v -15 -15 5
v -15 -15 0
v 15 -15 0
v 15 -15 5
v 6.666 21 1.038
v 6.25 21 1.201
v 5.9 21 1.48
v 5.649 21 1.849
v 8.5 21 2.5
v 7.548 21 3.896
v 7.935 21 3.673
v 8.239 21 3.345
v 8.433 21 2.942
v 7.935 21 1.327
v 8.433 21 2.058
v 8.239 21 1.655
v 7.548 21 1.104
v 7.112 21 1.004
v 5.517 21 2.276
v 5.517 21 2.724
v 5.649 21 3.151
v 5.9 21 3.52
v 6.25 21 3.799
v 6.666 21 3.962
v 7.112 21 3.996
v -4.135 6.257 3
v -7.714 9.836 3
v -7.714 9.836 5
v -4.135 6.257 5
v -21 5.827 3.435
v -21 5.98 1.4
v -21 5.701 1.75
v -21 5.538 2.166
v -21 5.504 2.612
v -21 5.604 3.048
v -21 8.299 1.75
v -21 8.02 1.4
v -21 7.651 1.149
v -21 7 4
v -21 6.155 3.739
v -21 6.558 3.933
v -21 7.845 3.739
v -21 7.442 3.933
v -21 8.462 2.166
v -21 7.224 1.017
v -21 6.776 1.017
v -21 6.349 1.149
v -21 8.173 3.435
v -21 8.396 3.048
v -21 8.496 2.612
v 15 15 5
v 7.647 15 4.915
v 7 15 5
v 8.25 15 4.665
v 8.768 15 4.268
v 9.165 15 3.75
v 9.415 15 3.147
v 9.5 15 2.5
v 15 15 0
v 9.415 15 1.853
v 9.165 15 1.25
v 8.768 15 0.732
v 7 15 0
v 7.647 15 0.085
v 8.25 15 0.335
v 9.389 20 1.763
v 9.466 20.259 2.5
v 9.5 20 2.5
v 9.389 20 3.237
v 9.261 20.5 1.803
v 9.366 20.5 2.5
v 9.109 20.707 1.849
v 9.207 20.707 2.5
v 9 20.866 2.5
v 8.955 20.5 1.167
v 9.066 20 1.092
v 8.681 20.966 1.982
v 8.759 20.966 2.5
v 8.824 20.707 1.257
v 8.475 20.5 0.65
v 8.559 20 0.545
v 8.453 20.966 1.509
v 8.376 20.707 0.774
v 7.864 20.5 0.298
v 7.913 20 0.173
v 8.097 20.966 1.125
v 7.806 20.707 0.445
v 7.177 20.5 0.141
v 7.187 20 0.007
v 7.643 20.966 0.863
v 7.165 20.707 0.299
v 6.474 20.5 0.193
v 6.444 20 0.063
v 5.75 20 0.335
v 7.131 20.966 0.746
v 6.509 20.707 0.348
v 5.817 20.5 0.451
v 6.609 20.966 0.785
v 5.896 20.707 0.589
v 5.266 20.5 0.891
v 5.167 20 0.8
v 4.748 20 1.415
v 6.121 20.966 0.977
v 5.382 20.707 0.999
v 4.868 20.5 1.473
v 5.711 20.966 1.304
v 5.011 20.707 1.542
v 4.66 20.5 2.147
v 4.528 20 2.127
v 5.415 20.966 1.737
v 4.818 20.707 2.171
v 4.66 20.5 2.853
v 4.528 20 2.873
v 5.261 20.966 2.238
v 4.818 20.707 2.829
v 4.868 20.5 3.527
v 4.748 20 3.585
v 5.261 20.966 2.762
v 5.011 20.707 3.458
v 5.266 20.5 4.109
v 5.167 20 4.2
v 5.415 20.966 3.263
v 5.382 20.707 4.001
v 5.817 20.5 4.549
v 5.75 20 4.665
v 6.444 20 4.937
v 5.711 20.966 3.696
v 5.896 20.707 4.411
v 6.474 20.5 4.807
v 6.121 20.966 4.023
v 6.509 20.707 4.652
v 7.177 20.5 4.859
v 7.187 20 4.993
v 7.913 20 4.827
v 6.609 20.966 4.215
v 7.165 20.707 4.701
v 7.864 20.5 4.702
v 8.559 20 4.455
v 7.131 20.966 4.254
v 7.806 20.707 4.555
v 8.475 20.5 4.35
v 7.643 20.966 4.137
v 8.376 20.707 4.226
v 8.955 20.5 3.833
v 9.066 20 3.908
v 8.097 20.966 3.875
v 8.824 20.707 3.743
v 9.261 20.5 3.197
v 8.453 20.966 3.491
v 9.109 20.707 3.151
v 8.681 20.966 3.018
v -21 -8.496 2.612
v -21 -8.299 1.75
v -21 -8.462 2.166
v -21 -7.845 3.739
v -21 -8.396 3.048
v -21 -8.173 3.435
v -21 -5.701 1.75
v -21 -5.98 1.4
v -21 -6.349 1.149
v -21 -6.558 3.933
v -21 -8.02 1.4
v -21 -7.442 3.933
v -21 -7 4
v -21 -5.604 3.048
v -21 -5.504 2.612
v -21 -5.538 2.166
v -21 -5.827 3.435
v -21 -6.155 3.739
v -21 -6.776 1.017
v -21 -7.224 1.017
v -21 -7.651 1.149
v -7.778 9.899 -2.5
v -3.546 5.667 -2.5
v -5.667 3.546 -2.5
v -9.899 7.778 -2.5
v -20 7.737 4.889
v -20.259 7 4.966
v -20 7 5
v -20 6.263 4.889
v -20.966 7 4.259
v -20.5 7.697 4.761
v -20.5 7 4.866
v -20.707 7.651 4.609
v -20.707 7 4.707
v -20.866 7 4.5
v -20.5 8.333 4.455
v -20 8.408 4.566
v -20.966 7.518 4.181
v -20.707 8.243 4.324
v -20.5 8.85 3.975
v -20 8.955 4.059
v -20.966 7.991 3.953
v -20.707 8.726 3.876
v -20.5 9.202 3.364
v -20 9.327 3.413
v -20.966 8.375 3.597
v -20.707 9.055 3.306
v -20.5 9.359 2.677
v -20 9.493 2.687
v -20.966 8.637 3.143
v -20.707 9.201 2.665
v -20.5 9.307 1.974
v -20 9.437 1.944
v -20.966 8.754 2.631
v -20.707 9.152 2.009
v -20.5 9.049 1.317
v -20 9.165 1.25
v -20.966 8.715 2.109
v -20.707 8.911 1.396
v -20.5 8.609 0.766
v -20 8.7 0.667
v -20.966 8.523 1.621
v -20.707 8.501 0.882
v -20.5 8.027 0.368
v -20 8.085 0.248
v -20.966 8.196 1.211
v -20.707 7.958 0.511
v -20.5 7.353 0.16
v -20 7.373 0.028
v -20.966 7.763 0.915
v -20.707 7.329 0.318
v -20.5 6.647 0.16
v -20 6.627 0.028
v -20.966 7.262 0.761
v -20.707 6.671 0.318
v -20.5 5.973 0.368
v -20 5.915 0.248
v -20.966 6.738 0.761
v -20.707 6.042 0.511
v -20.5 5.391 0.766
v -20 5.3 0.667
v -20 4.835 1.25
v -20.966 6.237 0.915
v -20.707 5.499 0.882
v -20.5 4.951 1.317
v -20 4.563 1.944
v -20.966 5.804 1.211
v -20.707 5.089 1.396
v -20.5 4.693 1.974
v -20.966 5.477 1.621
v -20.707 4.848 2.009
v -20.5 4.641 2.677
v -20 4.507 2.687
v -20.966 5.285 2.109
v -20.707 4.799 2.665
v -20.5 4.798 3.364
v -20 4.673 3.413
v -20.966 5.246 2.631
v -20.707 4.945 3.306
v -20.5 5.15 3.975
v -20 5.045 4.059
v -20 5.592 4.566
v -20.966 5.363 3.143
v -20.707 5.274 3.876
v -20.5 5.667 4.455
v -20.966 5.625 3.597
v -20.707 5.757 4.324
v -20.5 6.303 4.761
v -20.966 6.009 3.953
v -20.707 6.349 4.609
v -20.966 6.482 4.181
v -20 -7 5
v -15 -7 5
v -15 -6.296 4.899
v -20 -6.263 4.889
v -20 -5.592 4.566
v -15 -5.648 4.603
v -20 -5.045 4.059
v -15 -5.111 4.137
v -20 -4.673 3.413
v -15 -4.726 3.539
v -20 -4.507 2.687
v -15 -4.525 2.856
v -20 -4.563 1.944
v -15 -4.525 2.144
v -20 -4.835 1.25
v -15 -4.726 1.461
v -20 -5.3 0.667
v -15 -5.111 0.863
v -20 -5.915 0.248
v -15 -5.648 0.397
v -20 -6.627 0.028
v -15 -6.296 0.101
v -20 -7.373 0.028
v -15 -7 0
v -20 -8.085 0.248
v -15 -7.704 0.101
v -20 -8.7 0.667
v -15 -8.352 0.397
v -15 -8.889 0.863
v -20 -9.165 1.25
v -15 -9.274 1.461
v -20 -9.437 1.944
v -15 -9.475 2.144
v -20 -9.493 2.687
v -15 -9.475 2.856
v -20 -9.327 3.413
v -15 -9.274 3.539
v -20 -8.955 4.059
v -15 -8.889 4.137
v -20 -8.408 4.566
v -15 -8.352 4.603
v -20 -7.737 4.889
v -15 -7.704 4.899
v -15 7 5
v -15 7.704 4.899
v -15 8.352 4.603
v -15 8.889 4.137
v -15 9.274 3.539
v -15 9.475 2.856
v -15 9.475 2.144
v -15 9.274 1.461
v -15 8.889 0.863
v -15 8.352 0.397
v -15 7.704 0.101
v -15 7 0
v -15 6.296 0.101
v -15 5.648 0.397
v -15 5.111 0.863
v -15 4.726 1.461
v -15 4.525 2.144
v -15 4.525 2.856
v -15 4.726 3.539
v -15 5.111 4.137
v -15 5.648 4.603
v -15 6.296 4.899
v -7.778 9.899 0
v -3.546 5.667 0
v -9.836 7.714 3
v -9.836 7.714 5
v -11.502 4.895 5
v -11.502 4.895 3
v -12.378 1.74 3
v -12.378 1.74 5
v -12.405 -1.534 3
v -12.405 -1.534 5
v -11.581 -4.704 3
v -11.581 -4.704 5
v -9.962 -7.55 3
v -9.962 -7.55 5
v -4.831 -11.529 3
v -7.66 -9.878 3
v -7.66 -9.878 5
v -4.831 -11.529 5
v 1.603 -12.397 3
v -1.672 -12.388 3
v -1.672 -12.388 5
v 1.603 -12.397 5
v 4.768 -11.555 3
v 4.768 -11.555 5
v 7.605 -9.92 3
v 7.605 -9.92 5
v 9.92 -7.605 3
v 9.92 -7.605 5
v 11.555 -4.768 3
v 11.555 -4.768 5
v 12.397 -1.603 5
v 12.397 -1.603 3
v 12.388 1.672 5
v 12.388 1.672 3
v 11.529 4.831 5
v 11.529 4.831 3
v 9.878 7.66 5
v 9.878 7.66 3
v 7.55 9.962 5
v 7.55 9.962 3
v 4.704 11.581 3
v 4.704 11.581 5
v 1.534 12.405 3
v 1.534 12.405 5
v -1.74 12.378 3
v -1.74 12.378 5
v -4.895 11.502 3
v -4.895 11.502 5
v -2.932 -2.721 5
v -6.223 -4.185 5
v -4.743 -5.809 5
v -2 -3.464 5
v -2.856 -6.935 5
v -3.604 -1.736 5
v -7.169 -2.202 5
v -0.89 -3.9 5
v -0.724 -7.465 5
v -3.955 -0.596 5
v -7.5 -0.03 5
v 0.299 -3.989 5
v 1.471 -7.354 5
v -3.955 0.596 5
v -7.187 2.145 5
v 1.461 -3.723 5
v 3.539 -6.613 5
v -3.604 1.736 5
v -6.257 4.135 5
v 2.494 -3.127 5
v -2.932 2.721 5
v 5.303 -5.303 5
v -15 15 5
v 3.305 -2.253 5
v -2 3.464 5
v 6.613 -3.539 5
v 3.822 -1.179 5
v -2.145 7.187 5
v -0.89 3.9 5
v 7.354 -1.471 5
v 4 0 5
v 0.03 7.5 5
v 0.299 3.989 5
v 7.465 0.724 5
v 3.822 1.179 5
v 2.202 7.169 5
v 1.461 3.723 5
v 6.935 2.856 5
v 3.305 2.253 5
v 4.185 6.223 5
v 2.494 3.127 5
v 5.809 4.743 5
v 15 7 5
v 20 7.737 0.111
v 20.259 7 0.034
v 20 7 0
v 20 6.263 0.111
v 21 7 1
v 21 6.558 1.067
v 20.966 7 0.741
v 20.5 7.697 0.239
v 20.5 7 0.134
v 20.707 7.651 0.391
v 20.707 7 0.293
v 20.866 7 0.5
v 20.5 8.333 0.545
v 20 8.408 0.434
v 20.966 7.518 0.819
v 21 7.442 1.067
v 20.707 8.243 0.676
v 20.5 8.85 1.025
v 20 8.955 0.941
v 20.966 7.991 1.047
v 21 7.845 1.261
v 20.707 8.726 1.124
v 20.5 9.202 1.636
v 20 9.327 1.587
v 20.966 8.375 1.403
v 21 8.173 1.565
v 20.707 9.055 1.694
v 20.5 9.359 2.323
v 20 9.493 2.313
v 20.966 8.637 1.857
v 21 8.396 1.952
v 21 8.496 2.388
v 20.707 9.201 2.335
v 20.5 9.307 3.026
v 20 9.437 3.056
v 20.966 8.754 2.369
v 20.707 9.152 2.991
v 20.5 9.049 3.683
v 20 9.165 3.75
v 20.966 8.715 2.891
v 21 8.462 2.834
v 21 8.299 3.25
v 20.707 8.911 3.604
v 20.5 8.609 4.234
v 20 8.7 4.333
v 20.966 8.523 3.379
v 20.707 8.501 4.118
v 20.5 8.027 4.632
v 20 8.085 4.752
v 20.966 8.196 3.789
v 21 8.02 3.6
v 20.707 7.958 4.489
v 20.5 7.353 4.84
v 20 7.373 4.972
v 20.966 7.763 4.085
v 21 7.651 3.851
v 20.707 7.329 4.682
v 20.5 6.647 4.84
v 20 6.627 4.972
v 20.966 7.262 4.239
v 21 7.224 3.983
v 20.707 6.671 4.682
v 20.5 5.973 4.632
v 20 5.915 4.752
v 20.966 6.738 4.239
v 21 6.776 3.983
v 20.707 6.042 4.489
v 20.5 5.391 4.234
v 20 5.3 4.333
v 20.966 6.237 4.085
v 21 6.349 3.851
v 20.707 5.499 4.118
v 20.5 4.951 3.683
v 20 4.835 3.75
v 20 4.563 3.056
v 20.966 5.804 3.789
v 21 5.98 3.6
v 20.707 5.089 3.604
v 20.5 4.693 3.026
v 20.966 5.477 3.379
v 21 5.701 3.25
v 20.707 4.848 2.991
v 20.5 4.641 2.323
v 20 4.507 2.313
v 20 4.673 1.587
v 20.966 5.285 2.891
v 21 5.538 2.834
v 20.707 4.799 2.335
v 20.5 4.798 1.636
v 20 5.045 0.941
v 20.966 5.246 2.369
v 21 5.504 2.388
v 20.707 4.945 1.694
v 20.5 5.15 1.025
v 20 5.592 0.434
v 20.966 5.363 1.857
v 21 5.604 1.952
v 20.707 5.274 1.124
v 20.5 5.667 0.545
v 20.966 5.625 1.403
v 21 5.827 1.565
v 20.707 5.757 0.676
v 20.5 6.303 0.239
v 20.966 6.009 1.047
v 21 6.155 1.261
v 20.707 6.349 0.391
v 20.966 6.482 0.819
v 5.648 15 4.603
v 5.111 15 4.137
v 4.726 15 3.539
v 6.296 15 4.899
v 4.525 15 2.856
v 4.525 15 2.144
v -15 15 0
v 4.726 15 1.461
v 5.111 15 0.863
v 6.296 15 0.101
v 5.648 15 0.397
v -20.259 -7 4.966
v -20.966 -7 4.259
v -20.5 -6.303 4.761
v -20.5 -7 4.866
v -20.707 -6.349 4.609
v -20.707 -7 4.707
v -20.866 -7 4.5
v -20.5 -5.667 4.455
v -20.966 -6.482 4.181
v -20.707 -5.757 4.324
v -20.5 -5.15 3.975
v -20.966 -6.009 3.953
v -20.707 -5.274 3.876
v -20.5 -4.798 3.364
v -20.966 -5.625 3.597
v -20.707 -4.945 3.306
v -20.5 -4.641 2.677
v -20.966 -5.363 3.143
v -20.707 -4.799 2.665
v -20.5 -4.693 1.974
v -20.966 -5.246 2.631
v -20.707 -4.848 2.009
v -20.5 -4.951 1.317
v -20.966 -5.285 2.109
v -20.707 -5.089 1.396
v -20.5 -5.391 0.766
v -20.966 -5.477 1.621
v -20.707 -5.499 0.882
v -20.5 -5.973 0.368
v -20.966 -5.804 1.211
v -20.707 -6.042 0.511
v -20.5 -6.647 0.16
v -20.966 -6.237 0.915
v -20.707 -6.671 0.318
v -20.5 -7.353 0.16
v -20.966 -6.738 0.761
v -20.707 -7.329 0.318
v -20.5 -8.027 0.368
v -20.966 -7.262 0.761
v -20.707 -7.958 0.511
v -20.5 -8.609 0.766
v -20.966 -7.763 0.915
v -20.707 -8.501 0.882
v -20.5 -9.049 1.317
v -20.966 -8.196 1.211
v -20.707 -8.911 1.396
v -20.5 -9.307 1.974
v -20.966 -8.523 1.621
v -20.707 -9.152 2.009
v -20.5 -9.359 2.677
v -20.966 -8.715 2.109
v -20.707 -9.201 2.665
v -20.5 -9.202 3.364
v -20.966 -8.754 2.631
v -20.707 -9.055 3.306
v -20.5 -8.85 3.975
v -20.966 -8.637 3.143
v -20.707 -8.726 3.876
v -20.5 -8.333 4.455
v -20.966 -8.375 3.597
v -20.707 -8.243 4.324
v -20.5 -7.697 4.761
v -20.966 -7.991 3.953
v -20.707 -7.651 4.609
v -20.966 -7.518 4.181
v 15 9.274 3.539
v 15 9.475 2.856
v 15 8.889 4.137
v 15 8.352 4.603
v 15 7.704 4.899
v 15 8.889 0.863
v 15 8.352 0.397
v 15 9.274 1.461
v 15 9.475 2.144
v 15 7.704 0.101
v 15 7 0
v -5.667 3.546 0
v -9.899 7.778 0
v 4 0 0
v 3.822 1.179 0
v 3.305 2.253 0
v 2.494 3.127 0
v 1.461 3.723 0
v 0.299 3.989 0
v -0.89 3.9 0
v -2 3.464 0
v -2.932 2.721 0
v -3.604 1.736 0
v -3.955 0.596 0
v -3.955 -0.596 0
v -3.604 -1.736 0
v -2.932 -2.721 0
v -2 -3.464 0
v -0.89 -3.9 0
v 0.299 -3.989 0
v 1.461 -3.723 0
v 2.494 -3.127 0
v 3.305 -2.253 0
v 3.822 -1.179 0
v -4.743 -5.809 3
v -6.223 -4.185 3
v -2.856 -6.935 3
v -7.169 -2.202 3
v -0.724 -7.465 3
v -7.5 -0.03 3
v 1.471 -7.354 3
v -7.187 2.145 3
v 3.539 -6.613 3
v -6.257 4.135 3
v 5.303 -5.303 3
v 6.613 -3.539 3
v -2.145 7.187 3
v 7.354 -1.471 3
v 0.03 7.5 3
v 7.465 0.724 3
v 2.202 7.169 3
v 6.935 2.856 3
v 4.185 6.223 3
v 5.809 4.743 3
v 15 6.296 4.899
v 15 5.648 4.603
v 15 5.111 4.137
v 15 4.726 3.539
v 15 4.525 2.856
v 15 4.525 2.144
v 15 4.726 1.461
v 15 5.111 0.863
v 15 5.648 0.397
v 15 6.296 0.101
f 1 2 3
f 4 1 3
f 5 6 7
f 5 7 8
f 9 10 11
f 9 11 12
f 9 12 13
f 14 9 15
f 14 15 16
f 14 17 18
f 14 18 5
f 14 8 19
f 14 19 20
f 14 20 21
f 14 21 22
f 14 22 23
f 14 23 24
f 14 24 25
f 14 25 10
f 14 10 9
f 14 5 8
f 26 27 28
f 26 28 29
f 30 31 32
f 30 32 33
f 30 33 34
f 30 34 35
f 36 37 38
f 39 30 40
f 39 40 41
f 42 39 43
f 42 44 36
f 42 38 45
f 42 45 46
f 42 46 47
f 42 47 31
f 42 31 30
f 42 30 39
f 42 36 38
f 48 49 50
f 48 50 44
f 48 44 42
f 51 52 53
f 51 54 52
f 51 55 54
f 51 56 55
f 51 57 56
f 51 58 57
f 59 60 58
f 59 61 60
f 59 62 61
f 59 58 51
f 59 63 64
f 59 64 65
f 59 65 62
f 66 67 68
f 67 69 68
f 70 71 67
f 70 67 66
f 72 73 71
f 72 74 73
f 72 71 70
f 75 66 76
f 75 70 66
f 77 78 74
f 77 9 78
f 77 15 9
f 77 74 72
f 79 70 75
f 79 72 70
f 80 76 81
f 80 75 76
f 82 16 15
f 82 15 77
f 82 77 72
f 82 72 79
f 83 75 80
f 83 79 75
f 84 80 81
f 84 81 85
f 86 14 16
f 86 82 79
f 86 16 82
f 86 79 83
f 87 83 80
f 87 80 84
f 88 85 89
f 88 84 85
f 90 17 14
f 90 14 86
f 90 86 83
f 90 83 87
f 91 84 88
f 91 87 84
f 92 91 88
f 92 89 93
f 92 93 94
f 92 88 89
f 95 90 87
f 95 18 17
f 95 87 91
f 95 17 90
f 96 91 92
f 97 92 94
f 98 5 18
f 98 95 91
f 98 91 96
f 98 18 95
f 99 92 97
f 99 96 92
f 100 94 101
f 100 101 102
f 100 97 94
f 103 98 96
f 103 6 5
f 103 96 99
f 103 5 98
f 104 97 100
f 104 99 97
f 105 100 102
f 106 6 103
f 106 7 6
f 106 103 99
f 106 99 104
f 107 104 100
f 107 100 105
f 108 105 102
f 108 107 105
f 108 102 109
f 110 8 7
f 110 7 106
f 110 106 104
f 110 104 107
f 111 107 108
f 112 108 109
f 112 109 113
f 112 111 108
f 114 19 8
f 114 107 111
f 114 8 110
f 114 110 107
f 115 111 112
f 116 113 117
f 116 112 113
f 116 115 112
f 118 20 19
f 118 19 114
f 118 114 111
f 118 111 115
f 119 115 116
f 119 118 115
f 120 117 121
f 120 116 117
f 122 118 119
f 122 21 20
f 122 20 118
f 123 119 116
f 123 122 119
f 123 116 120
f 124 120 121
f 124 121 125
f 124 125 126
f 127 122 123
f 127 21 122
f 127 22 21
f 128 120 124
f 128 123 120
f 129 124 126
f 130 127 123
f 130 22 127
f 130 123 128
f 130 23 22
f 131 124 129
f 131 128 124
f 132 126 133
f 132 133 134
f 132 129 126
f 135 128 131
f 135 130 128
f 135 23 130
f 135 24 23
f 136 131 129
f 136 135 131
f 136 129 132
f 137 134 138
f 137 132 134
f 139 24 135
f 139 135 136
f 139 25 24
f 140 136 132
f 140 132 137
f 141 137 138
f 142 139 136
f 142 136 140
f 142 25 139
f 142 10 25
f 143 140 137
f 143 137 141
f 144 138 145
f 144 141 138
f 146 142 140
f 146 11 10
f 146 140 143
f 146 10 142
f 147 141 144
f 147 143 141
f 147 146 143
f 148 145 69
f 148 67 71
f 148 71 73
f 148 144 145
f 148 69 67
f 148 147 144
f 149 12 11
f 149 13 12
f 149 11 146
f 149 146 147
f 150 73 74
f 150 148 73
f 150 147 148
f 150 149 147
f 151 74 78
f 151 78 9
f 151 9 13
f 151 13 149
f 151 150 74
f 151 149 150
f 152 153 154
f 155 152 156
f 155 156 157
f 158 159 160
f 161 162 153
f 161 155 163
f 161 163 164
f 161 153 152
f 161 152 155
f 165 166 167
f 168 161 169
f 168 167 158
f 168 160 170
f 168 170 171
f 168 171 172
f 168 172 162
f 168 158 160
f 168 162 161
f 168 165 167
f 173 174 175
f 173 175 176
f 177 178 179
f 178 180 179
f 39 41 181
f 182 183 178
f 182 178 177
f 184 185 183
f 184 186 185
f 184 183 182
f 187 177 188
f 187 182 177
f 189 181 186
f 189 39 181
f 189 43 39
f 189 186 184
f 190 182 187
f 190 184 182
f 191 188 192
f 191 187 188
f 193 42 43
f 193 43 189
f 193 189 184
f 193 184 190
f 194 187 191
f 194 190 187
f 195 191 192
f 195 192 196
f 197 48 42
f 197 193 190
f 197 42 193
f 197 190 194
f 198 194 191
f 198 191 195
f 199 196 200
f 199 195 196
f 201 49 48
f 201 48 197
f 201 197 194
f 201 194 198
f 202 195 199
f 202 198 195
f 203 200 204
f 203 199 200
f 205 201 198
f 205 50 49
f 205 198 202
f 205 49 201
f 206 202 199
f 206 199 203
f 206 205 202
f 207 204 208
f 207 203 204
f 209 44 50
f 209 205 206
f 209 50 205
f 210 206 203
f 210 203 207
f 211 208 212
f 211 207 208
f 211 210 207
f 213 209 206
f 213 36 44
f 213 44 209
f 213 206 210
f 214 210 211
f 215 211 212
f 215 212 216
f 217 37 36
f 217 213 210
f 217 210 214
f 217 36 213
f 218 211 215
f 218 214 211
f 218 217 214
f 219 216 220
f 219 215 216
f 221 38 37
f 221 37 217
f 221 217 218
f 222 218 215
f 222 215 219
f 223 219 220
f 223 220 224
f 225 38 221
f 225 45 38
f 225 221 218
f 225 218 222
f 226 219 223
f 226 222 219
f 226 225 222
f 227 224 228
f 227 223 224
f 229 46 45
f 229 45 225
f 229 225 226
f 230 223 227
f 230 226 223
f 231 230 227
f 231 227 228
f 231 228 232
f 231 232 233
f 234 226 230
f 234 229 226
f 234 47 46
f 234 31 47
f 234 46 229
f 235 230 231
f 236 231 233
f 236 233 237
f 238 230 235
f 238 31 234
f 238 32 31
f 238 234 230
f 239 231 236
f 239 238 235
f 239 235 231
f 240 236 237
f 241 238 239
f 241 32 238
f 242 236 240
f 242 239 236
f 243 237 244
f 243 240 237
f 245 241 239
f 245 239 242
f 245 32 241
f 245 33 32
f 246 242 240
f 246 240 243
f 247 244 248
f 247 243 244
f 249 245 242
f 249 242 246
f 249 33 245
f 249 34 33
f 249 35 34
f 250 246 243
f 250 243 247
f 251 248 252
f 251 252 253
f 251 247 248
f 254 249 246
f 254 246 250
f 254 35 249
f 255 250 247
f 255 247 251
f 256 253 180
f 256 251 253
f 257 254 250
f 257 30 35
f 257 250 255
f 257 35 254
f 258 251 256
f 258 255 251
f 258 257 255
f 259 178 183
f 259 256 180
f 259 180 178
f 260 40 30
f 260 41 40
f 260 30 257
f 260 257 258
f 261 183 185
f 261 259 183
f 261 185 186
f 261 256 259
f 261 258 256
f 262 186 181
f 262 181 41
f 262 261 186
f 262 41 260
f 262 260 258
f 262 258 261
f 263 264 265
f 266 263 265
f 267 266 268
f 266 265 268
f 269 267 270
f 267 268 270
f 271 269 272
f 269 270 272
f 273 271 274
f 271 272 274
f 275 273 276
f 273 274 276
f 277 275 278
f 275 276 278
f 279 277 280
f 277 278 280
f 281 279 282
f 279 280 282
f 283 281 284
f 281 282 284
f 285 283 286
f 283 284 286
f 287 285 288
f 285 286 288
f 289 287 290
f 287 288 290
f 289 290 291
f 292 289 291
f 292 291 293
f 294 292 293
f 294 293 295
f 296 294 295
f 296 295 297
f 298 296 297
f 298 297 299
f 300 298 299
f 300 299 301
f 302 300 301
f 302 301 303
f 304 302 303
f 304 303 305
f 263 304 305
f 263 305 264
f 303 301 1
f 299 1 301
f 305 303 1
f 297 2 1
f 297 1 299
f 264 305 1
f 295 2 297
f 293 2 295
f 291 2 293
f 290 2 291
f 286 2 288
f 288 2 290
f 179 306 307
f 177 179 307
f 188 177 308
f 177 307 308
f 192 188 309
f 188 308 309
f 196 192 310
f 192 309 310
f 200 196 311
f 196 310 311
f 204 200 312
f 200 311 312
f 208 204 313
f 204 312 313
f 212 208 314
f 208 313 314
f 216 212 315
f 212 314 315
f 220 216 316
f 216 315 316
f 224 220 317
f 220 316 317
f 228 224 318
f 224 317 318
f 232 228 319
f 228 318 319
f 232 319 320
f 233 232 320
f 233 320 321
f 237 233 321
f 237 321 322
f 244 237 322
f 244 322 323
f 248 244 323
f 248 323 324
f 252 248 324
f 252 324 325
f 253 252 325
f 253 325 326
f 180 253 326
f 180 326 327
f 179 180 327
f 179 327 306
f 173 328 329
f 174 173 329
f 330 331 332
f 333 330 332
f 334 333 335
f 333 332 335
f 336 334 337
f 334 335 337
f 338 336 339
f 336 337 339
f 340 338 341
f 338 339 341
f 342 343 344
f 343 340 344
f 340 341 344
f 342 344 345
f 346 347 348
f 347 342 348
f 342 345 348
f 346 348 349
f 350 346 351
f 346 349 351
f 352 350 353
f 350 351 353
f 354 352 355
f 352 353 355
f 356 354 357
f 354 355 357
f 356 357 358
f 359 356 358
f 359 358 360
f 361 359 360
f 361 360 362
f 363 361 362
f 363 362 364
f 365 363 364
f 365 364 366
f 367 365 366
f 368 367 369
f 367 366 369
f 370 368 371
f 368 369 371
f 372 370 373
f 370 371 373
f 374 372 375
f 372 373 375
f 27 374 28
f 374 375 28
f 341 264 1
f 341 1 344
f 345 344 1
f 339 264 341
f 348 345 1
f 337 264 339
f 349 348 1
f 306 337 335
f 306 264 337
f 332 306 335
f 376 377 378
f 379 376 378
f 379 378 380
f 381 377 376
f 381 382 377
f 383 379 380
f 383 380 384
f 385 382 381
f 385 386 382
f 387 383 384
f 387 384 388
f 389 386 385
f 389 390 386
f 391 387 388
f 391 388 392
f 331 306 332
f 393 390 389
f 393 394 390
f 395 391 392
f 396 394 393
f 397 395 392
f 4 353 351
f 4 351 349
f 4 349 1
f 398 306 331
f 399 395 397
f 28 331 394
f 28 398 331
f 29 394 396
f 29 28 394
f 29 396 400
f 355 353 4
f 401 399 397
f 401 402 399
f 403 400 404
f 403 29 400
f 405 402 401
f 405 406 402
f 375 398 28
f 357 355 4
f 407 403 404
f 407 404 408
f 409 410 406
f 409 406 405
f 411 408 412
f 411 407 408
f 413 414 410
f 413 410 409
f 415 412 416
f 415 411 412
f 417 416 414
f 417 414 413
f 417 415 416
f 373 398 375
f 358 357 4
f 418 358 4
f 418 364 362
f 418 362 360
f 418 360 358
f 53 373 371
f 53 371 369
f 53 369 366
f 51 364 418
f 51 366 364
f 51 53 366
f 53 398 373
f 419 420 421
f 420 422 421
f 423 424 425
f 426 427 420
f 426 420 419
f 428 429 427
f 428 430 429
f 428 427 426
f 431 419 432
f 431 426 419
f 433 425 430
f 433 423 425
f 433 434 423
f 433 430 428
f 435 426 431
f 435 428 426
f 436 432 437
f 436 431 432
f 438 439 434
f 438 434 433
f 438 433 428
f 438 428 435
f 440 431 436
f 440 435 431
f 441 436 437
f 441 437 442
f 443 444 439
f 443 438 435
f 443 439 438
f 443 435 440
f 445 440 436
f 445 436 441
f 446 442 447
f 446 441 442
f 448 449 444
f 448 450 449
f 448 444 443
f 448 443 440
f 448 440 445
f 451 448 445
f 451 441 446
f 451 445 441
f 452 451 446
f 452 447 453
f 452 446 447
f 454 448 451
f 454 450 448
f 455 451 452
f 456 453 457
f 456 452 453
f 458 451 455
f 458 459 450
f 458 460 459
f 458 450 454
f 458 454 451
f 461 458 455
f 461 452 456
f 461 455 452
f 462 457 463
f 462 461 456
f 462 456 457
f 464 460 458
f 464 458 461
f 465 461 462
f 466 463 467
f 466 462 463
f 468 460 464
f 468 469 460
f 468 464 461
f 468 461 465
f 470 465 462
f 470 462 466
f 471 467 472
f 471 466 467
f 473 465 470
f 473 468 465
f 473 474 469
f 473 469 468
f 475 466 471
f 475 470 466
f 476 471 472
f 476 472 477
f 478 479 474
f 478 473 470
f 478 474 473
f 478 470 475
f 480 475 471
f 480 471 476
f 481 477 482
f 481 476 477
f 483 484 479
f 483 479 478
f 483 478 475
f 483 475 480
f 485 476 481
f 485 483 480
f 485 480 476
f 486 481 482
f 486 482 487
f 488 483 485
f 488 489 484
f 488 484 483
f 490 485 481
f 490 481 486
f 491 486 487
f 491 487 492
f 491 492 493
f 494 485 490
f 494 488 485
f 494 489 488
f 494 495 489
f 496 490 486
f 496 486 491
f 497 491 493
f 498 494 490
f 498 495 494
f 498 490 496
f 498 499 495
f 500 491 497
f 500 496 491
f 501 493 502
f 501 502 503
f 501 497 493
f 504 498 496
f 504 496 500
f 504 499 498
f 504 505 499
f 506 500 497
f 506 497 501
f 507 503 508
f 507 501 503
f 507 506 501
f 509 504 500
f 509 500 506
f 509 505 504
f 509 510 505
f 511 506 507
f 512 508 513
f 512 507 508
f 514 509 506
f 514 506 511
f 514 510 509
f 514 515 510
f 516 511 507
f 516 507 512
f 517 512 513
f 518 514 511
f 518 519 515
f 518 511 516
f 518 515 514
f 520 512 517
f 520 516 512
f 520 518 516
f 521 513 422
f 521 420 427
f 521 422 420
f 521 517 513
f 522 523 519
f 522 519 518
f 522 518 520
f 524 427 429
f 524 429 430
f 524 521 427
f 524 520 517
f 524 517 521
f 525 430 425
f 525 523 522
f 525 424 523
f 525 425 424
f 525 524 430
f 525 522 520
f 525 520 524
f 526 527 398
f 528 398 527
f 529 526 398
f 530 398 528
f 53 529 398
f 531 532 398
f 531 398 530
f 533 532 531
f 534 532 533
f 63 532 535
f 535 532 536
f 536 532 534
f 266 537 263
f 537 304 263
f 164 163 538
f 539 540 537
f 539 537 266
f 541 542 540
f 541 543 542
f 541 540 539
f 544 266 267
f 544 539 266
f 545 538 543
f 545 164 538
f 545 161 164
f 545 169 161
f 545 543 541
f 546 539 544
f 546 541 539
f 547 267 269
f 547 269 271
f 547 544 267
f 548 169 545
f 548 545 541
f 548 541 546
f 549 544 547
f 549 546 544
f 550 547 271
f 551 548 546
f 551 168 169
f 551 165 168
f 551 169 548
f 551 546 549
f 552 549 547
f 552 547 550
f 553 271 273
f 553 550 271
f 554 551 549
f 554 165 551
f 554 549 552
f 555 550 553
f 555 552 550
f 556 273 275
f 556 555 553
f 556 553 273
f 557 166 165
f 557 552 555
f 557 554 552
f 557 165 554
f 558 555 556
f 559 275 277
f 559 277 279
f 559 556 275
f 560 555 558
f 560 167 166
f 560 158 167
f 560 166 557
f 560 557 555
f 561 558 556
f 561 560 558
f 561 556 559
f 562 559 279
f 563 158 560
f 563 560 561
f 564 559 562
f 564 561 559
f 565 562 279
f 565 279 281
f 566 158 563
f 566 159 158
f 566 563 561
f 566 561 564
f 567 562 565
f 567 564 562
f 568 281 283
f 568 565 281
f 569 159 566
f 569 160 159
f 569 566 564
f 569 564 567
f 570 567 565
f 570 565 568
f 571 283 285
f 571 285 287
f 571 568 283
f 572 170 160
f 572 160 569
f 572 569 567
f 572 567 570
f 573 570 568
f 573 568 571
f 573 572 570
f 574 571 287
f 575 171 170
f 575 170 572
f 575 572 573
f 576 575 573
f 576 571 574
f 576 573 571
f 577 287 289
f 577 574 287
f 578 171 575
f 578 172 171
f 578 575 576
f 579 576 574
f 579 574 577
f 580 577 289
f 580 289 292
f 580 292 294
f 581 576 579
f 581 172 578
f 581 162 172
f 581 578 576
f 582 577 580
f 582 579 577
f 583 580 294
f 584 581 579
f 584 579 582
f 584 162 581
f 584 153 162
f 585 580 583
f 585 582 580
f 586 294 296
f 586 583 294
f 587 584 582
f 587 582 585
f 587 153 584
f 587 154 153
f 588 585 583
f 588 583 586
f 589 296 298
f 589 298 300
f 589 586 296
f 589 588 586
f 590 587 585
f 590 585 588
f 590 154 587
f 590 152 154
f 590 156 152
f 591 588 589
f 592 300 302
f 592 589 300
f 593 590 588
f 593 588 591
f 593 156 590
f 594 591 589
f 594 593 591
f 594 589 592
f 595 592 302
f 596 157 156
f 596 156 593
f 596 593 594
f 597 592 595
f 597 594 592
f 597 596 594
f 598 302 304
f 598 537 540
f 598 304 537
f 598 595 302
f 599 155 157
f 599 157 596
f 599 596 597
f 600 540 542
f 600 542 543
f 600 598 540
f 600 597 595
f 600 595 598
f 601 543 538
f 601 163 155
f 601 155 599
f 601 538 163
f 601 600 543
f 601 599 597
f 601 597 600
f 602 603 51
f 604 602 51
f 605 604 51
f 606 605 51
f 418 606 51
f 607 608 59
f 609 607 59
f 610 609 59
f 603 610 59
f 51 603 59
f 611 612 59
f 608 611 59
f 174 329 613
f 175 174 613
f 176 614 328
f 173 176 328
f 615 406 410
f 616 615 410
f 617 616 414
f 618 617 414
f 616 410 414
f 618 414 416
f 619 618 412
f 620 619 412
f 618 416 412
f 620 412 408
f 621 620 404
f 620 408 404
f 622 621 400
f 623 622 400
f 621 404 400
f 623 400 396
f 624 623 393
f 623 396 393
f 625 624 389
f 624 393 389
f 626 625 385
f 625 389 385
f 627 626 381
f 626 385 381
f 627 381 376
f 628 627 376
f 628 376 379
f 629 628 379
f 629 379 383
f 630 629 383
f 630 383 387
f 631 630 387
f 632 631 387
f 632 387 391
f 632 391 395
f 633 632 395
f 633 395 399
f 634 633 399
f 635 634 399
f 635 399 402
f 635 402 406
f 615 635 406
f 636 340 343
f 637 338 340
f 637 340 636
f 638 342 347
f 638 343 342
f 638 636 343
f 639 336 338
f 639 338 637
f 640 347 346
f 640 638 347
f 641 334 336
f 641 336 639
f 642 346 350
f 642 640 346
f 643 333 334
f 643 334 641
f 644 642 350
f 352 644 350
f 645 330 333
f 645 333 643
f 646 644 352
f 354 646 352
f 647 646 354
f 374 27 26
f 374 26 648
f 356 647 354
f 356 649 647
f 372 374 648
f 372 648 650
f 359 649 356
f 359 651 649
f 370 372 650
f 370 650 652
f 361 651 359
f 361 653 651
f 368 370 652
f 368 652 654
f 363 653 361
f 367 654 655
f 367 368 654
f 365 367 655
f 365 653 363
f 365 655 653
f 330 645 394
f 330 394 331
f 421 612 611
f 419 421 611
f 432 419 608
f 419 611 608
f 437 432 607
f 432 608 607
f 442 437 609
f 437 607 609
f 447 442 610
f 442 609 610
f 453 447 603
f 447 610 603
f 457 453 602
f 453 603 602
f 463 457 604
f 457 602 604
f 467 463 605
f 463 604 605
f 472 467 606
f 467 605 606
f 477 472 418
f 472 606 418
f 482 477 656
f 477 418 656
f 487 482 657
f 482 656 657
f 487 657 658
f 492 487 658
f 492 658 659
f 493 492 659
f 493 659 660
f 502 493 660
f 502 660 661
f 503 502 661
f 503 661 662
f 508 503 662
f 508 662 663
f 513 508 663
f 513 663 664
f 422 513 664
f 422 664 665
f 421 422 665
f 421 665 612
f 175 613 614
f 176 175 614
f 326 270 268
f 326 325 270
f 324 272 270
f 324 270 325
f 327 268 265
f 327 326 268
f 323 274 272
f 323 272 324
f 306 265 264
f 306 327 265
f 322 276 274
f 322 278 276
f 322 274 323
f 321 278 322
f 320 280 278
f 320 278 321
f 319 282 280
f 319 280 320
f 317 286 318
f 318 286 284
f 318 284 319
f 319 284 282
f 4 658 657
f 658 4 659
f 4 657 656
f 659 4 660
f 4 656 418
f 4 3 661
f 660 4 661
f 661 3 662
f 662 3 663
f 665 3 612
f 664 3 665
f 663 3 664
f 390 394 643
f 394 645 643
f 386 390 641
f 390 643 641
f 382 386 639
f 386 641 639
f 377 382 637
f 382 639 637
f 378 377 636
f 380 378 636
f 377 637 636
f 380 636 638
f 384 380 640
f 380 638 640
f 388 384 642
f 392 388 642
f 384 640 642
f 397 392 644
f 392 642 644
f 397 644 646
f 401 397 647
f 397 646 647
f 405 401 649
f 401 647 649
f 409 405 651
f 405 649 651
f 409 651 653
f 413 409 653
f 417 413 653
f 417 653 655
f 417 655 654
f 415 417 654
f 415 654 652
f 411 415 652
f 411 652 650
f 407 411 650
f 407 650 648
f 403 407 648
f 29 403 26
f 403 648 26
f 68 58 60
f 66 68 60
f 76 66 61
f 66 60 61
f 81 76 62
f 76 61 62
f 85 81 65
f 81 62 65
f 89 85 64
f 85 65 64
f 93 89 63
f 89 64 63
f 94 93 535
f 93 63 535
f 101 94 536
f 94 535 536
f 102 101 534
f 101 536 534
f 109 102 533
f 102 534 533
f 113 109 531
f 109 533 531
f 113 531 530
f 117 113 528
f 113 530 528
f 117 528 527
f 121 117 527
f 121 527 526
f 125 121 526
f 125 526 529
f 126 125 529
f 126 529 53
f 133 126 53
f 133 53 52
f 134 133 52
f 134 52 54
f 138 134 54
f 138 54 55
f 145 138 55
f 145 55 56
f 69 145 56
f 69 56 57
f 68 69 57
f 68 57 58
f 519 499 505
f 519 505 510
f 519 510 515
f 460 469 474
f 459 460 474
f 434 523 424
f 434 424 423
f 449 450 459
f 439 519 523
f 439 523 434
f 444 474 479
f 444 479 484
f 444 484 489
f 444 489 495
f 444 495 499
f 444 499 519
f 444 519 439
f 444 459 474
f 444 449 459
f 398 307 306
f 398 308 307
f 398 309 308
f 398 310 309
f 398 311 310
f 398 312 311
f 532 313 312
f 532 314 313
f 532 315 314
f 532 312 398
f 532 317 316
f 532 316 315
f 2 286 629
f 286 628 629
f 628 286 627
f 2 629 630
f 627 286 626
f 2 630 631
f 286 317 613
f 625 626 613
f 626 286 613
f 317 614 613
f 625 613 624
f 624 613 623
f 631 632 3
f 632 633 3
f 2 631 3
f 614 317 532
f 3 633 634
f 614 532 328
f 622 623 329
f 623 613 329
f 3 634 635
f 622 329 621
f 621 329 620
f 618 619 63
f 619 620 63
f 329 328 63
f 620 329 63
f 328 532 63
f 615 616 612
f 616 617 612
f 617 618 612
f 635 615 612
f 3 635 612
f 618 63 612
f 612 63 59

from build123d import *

# Parameters (mm, degrees)
ESQUISSE2_W              = 30
ESQUISSE2_H              = 30
BOSS_EXTRU_1_DEPTH       = 5
ESQUISSE16_R             = 2.5
BOSS_EXTRU_7_DEPTH       = 6
CONG_3_R                 = 1
ESQUISSE18_R             = 2.5
BOSS_EXTRU_9_DEPTH       = 6
CONG_5_R                 = 1
ESQUISSE8_R              = 12.5
ENL_V_MAT_EXTRU_1_DEPTH  = 2
ESQUISSE19_R             = 7.5
BOSS_EXTRU_10_DEPTH      = 2
ESQUISSE33_R             = 4
ENL_V_MAT_EXTRU_3_DEPTH  = 6
ESQUISSE35_R             = 2.5
BOSS_EXTRU_26_DEPTH      = 6
CONG_6_R                 = 1
BOSS_EXTRU_27_DEPTH      = 2
BOSS_EXTRU_27_DEPTH_BACK = 5.5


with BuildPart() as part:
    # Esquisse2 → Boss.-Extru.1 (new body)
    with BuildSketch(Plane.XY):
        Rectangle(ESQUISSE2_W, ESQUISSE2_H)
    extrude(amount=BOSS_EXTRU_1_DEPTH)

    # Esquisse16 → Boss.-Extru.7 (add)
    with BuildSketch(Plane.ZY.offset(15)):
        with Locations((2.5, 7)):
            Circle(ESQUISSE16_R)
        with Locations((2.5, -7)):
            Circle(ESQUISSE16_R)
    extrude(amount=BOSS_EXTRU_7_DEPTH)

    # Congé3
    cong_3_edges = [part.edges().sort_by_distance(p)[0] for p in [
        (-21, 7, 0),
        (-21, -7, 0),
    ]]
    fillet(cong_3_edges, radius=CONG_3_R)

    # Esquisse18 → Boss.-Extru.9 (add)
    with BuildSketch(Plane(origin=(15, 0, 0), x_dir=(0, 0, -1), z_dir=(1, 0, 0))):
        with Locations((-2.5, 7)):
            Circle(ESQUISSE18_R)
    extrude(amount=BOSS_EXTRU_9_DEPTH)

    # Congé5
    cong_5_edges = [part.edges().sort_by_distance(p)[0] for p in [
        (21, 7, 5),
    ]]
    fillet(cong_5_edges, radius=CONG_5_R)

    # Esquisse8 → Enlèv. mat.-Extru.1 (cut)
    with BuildSketch(Plane.XY.offset(5)):
        Circle(ESQUISSE8_R)
    extrude(amount=-ENL_V_MAT_EXTRU_1_DEPTH, mode=Mode.SUBTRACT)

    # Esquisse19 → Boss.-Extru.10 (add)
    with BuildSketch(Plane.XY.offset(3)):
        Circle(ESQUISSE19_R)
    extrude(amount=BOSS_EXTRU_10_DEPTH)

    # Esquisse33 → Enlèv. mat.-Extru.3 (cut, through all)
    with BuildSketch(Plane.XY.offset(5)):
        Circle(ESQUISSE33_R)
    extrude(amount=-ENL_V_MAT_EXTRU_3_DEPTH, mode=Mode.SUBTRACT)

    # Esquisse35 → Boss.-Extru.26 (add)
    with BuildSketch(Plane(origin=(0, 15, 0), x_dir=(1, 0, 0), z_dir=(0, 1, 0))):
        with Locations((7, -2.5)):
            Circle(ESQUISSE35_R)
    extrude(amount=BOSS_EXTRU_26_DEPTH)

    # Congé6
    cong_6_edges = [part.edges().sort_by_distance(p)[0] for p in [
        (4.5, 21, 2.5),
    ]]
    fillet(cong_6_edges, radius=CONG_6_R)

    # Esquisse31 → Boss.-Extru.27 (add, two sides)
    with BuildSketch(Plane.XY.offset(3)) as boss_extru_27_sk:
        Polygon((-9.899494937, 7.778174593), (-7.778174593, 9.899494937), (-3.545672625, 5.666992969), (-5.666992969, 3.545672625), align=None)
    extrude(amount=BOSS_EXTRU_27_DEPTH)
    extrude(boss_extru_27_sk.sketch, amount=-BOSS_EXTRU_27_DEPTH_BACK)


solid = part.part
